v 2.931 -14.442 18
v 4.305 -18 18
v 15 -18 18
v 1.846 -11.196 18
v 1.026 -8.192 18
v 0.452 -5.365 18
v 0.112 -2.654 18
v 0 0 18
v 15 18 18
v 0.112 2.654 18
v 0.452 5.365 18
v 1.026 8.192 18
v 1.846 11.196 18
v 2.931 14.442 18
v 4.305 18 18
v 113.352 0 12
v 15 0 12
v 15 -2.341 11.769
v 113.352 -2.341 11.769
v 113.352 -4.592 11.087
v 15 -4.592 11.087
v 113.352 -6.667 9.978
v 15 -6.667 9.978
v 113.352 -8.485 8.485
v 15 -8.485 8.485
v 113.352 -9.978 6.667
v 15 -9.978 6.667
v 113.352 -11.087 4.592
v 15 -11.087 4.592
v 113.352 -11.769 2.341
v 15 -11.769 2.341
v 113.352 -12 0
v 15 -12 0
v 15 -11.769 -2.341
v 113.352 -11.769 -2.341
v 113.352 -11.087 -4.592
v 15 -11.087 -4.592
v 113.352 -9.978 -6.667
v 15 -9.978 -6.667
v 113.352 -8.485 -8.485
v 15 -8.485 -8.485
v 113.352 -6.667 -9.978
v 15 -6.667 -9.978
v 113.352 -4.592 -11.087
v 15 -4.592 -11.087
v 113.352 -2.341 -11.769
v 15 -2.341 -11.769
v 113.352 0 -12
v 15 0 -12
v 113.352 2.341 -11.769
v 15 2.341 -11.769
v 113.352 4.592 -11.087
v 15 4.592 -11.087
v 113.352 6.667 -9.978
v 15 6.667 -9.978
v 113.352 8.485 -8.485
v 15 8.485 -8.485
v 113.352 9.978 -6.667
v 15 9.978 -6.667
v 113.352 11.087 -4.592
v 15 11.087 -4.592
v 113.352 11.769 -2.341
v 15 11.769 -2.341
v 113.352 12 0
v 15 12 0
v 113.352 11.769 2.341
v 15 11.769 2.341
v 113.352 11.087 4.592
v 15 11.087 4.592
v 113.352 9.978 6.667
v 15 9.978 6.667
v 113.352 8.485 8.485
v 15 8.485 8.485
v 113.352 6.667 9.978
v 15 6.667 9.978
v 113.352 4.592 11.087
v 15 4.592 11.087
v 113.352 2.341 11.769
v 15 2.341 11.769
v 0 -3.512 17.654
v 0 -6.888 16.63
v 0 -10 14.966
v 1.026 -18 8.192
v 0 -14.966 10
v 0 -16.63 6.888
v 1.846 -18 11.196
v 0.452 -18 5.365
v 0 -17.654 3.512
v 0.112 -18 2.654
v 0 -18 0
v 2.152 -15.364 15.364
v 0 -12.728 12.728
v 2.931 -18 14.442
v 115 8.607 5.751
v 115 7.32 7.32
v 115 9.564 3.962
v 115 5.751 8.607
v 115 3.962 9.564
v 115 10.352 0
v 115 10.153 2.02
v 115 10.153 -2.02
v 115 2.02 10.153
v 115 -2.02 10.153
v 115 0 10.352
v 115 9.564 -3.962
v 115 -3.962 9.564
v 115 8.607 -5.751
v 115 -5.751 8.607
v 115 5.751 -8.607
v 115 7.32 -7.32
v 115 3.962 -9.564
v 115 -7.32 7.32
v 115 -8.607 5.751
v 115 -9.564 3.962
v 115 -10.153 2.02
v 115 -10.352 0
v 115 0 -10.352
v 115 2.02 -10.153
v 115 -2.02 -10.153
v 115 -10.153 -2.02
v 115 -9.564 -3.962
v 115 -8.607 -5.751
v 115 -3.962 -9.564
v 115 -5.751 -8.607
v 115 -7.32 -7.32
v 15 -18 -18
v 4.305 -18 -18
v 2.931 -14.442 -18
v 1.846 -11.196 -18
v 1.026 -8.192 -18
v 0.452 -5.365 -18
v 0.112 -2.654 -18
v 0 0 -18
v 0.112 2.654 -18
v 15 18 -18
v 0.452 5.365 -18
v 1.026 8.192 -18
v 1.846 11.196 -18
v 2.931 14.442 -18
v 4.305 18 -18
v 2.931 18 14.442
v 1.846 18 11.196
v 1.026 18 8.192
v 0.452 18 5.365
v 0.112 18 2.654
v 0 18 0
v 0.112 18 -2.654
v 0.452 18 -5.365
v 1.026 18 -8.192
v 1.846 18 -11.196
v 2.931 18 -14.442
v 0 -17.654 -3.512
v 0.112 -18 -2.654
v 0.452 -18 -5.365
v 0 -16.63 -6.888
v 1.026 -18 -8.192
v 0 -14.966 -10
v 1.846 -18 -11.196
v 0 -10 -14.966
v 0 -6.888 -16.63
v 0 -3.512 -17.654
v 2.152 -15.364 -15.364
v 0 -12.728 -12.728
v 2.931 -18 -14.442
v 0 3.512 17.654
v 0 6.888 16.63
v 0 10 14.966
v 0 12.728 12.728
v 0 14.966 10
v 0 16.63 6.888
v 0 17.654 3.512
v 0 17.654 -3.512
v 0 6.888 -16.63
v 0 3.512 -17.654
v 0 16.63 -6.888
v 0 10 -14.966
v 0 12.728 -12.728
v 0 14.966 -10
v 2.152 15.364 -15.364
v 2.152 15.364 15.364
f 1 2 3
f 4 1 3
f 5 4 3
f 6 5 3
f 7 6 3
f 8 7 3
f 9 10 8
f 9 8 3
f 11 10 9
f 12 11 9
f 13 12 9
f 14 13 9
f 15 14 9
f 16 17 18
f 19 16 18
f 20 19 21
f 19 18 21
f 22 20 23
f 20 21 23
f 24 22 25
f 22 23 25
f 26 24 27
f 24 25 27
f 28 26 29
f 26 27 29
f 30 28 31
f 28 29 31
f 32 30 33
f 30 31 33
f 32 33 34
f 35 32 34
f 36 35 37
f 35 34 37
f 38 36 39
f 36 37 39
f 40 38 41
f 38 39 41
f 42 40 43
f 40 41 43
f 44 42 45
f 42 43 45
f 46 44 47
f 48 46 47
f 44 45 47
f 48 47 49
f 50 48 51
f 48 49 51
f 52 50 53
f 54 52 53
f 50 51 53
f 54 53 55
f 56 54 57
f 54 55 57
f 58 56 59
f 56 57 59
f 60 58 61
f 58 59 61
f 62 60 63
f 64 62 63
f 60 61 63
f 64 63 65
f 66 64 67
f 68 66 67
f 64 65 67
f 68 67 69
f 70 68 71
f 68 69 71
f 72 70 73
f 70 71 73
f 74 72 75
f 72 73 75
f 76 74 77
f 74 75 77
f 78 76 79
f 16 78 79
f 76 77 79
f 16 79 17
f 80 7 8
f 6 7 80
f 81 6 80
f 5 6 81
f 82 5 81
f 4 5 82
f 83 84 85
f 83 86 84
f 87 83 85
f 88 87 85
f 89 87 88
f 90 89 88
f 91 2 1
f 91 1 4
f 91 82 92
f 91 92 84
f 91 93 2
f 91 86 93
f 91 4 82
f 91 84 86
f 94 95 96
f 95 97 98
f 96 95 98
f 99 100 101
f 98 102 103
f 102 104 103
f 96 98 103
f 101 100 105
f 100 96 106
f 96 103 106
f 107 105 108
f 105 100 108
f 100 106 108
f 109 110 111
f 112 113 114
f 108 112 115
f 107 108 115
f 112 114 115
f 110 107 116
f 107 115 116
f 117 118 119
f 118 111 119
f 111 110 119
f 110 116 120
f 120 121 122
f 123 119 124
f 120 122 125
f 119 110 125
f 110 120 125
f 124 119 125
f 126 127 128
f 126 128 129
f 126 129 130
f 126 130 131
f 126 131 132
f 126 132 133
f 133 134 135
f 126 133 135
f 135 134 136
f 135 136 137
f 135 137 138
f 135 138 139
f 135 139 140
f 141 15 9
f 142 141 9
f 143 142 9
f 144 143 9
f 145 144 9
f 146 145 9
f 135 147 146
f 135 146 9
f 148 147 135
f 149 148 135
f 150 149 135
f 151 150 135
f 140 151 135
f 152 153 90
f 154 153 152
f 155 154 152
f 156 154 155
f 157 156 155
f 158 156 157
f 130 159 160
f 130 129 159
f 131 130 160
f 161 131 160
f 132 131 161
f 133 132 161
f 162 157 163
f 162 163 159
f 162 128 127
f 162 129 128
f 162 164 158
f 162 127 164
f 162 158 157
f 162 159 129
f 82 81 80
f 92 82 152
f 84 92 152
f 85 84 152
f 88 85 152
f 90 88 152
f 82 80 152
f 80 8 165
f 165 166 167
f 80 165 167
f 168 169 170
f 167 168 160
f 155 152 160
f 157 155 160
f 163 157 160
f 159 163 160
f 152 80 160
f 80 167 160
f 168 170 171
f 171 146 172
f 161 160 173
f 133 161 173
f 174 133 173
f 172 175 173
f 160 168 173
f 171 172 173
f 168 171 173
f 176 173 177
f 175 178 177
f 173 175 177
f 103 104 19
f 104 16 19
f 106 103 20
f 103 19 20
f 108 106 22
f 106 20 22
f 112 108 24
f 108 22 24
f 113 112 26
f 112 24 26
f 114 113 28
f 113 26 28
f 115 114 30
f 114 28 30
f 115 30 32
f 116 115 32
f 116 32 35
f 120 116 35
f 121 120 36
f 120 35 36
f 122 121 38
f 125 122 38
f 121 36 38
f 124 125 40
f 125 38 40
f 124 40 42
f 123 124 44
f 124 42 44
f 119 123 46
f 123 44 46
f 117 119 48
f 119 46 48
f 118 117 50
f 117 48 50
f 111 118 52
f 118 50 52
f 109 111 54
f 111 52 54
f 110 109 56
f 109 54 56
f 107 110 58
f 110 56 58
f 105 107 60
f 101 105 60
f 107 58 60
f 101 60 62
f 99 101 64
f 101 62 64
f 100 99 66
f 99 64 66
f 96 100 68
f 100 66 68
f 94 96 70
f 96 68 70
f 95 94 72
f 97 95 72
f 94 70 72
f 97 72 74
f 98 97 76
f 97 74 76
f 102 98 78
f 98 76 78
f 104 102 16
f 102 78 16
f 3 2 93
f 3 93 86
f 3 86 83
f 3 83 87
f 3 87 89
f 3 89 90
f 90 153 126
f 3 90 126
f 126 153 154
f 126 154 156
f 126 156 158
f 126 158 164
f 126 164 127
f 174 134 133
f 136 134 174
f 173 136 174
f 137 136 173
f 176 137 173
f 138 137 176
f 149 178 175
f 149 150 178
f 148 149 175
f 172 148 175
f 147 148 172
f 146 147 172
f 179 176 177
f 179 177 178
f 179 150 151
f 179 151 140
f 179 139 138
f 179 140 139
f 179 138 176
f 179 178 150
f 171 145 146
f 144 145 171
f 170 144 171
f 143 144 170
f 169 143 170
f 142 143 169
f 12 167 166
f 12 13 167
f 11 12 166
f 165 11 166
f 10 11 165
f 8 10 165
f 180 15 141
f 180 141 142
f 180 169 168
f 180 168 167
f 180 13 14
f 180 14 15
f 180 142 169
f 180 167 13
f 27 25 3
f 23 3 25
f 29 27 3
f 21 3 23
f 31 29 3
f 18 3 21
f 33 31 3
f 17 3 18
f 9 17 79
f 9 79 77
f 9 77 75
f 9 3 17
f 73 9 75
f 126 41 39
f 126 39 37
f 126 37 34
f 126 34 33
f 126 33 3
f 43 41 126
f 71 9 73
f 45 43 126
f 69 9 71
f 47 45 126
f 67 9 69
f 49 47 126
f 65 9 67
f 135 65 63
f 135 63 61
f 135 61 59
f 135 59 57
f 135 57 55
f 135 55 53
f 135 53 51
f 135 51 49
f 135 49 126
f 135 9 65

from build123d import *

# Parameters (mm, degrees)
SKETCH1_W      = 36
SKETCH1_H      = 36
BASEHEAD_DEPTH = 15


with BuildPart() as part:
    # Sketch1 → BaseHead (new body)
    with BuildSketch(Plane(origin=(0, 0, 0), x_dir=(0, 0, -1), z_dir=(1, 0, 0))):
        Rectangle(SKETCH1_W, SKETCH1_H)
    extrude(amount=BASEHEAD_DEPTH)

    # BodySke → BaseBody (revolve)
    with BuildSketch(Plane.XY, mode=Mode.PRIVATE) as basebody_sk:
        Polygon((0, 0), (115, 0), (115, 10.352), (113.352, 12), (0, 12), align=None)
    revolve(basebody_sk.sketch.rotate(Axis((0, 0, 0), (1, 0, 0)), 90), axis=Axis((0, 0, 0), (1, 0, 0)))

    # Sketch3 → HeadChamfer (revolve, cut)
    with BuildSketch(Plane.XY):
        Polygon((0, 18), (5.196152423, 27), (5.196152423, 28), (-1, 28), (-1, 18), align=None)
    revolve(axis=Axis((0, 0, 0), (1, 0, 0)), mode=Mode.SUBTRACT)


solid = part.part
